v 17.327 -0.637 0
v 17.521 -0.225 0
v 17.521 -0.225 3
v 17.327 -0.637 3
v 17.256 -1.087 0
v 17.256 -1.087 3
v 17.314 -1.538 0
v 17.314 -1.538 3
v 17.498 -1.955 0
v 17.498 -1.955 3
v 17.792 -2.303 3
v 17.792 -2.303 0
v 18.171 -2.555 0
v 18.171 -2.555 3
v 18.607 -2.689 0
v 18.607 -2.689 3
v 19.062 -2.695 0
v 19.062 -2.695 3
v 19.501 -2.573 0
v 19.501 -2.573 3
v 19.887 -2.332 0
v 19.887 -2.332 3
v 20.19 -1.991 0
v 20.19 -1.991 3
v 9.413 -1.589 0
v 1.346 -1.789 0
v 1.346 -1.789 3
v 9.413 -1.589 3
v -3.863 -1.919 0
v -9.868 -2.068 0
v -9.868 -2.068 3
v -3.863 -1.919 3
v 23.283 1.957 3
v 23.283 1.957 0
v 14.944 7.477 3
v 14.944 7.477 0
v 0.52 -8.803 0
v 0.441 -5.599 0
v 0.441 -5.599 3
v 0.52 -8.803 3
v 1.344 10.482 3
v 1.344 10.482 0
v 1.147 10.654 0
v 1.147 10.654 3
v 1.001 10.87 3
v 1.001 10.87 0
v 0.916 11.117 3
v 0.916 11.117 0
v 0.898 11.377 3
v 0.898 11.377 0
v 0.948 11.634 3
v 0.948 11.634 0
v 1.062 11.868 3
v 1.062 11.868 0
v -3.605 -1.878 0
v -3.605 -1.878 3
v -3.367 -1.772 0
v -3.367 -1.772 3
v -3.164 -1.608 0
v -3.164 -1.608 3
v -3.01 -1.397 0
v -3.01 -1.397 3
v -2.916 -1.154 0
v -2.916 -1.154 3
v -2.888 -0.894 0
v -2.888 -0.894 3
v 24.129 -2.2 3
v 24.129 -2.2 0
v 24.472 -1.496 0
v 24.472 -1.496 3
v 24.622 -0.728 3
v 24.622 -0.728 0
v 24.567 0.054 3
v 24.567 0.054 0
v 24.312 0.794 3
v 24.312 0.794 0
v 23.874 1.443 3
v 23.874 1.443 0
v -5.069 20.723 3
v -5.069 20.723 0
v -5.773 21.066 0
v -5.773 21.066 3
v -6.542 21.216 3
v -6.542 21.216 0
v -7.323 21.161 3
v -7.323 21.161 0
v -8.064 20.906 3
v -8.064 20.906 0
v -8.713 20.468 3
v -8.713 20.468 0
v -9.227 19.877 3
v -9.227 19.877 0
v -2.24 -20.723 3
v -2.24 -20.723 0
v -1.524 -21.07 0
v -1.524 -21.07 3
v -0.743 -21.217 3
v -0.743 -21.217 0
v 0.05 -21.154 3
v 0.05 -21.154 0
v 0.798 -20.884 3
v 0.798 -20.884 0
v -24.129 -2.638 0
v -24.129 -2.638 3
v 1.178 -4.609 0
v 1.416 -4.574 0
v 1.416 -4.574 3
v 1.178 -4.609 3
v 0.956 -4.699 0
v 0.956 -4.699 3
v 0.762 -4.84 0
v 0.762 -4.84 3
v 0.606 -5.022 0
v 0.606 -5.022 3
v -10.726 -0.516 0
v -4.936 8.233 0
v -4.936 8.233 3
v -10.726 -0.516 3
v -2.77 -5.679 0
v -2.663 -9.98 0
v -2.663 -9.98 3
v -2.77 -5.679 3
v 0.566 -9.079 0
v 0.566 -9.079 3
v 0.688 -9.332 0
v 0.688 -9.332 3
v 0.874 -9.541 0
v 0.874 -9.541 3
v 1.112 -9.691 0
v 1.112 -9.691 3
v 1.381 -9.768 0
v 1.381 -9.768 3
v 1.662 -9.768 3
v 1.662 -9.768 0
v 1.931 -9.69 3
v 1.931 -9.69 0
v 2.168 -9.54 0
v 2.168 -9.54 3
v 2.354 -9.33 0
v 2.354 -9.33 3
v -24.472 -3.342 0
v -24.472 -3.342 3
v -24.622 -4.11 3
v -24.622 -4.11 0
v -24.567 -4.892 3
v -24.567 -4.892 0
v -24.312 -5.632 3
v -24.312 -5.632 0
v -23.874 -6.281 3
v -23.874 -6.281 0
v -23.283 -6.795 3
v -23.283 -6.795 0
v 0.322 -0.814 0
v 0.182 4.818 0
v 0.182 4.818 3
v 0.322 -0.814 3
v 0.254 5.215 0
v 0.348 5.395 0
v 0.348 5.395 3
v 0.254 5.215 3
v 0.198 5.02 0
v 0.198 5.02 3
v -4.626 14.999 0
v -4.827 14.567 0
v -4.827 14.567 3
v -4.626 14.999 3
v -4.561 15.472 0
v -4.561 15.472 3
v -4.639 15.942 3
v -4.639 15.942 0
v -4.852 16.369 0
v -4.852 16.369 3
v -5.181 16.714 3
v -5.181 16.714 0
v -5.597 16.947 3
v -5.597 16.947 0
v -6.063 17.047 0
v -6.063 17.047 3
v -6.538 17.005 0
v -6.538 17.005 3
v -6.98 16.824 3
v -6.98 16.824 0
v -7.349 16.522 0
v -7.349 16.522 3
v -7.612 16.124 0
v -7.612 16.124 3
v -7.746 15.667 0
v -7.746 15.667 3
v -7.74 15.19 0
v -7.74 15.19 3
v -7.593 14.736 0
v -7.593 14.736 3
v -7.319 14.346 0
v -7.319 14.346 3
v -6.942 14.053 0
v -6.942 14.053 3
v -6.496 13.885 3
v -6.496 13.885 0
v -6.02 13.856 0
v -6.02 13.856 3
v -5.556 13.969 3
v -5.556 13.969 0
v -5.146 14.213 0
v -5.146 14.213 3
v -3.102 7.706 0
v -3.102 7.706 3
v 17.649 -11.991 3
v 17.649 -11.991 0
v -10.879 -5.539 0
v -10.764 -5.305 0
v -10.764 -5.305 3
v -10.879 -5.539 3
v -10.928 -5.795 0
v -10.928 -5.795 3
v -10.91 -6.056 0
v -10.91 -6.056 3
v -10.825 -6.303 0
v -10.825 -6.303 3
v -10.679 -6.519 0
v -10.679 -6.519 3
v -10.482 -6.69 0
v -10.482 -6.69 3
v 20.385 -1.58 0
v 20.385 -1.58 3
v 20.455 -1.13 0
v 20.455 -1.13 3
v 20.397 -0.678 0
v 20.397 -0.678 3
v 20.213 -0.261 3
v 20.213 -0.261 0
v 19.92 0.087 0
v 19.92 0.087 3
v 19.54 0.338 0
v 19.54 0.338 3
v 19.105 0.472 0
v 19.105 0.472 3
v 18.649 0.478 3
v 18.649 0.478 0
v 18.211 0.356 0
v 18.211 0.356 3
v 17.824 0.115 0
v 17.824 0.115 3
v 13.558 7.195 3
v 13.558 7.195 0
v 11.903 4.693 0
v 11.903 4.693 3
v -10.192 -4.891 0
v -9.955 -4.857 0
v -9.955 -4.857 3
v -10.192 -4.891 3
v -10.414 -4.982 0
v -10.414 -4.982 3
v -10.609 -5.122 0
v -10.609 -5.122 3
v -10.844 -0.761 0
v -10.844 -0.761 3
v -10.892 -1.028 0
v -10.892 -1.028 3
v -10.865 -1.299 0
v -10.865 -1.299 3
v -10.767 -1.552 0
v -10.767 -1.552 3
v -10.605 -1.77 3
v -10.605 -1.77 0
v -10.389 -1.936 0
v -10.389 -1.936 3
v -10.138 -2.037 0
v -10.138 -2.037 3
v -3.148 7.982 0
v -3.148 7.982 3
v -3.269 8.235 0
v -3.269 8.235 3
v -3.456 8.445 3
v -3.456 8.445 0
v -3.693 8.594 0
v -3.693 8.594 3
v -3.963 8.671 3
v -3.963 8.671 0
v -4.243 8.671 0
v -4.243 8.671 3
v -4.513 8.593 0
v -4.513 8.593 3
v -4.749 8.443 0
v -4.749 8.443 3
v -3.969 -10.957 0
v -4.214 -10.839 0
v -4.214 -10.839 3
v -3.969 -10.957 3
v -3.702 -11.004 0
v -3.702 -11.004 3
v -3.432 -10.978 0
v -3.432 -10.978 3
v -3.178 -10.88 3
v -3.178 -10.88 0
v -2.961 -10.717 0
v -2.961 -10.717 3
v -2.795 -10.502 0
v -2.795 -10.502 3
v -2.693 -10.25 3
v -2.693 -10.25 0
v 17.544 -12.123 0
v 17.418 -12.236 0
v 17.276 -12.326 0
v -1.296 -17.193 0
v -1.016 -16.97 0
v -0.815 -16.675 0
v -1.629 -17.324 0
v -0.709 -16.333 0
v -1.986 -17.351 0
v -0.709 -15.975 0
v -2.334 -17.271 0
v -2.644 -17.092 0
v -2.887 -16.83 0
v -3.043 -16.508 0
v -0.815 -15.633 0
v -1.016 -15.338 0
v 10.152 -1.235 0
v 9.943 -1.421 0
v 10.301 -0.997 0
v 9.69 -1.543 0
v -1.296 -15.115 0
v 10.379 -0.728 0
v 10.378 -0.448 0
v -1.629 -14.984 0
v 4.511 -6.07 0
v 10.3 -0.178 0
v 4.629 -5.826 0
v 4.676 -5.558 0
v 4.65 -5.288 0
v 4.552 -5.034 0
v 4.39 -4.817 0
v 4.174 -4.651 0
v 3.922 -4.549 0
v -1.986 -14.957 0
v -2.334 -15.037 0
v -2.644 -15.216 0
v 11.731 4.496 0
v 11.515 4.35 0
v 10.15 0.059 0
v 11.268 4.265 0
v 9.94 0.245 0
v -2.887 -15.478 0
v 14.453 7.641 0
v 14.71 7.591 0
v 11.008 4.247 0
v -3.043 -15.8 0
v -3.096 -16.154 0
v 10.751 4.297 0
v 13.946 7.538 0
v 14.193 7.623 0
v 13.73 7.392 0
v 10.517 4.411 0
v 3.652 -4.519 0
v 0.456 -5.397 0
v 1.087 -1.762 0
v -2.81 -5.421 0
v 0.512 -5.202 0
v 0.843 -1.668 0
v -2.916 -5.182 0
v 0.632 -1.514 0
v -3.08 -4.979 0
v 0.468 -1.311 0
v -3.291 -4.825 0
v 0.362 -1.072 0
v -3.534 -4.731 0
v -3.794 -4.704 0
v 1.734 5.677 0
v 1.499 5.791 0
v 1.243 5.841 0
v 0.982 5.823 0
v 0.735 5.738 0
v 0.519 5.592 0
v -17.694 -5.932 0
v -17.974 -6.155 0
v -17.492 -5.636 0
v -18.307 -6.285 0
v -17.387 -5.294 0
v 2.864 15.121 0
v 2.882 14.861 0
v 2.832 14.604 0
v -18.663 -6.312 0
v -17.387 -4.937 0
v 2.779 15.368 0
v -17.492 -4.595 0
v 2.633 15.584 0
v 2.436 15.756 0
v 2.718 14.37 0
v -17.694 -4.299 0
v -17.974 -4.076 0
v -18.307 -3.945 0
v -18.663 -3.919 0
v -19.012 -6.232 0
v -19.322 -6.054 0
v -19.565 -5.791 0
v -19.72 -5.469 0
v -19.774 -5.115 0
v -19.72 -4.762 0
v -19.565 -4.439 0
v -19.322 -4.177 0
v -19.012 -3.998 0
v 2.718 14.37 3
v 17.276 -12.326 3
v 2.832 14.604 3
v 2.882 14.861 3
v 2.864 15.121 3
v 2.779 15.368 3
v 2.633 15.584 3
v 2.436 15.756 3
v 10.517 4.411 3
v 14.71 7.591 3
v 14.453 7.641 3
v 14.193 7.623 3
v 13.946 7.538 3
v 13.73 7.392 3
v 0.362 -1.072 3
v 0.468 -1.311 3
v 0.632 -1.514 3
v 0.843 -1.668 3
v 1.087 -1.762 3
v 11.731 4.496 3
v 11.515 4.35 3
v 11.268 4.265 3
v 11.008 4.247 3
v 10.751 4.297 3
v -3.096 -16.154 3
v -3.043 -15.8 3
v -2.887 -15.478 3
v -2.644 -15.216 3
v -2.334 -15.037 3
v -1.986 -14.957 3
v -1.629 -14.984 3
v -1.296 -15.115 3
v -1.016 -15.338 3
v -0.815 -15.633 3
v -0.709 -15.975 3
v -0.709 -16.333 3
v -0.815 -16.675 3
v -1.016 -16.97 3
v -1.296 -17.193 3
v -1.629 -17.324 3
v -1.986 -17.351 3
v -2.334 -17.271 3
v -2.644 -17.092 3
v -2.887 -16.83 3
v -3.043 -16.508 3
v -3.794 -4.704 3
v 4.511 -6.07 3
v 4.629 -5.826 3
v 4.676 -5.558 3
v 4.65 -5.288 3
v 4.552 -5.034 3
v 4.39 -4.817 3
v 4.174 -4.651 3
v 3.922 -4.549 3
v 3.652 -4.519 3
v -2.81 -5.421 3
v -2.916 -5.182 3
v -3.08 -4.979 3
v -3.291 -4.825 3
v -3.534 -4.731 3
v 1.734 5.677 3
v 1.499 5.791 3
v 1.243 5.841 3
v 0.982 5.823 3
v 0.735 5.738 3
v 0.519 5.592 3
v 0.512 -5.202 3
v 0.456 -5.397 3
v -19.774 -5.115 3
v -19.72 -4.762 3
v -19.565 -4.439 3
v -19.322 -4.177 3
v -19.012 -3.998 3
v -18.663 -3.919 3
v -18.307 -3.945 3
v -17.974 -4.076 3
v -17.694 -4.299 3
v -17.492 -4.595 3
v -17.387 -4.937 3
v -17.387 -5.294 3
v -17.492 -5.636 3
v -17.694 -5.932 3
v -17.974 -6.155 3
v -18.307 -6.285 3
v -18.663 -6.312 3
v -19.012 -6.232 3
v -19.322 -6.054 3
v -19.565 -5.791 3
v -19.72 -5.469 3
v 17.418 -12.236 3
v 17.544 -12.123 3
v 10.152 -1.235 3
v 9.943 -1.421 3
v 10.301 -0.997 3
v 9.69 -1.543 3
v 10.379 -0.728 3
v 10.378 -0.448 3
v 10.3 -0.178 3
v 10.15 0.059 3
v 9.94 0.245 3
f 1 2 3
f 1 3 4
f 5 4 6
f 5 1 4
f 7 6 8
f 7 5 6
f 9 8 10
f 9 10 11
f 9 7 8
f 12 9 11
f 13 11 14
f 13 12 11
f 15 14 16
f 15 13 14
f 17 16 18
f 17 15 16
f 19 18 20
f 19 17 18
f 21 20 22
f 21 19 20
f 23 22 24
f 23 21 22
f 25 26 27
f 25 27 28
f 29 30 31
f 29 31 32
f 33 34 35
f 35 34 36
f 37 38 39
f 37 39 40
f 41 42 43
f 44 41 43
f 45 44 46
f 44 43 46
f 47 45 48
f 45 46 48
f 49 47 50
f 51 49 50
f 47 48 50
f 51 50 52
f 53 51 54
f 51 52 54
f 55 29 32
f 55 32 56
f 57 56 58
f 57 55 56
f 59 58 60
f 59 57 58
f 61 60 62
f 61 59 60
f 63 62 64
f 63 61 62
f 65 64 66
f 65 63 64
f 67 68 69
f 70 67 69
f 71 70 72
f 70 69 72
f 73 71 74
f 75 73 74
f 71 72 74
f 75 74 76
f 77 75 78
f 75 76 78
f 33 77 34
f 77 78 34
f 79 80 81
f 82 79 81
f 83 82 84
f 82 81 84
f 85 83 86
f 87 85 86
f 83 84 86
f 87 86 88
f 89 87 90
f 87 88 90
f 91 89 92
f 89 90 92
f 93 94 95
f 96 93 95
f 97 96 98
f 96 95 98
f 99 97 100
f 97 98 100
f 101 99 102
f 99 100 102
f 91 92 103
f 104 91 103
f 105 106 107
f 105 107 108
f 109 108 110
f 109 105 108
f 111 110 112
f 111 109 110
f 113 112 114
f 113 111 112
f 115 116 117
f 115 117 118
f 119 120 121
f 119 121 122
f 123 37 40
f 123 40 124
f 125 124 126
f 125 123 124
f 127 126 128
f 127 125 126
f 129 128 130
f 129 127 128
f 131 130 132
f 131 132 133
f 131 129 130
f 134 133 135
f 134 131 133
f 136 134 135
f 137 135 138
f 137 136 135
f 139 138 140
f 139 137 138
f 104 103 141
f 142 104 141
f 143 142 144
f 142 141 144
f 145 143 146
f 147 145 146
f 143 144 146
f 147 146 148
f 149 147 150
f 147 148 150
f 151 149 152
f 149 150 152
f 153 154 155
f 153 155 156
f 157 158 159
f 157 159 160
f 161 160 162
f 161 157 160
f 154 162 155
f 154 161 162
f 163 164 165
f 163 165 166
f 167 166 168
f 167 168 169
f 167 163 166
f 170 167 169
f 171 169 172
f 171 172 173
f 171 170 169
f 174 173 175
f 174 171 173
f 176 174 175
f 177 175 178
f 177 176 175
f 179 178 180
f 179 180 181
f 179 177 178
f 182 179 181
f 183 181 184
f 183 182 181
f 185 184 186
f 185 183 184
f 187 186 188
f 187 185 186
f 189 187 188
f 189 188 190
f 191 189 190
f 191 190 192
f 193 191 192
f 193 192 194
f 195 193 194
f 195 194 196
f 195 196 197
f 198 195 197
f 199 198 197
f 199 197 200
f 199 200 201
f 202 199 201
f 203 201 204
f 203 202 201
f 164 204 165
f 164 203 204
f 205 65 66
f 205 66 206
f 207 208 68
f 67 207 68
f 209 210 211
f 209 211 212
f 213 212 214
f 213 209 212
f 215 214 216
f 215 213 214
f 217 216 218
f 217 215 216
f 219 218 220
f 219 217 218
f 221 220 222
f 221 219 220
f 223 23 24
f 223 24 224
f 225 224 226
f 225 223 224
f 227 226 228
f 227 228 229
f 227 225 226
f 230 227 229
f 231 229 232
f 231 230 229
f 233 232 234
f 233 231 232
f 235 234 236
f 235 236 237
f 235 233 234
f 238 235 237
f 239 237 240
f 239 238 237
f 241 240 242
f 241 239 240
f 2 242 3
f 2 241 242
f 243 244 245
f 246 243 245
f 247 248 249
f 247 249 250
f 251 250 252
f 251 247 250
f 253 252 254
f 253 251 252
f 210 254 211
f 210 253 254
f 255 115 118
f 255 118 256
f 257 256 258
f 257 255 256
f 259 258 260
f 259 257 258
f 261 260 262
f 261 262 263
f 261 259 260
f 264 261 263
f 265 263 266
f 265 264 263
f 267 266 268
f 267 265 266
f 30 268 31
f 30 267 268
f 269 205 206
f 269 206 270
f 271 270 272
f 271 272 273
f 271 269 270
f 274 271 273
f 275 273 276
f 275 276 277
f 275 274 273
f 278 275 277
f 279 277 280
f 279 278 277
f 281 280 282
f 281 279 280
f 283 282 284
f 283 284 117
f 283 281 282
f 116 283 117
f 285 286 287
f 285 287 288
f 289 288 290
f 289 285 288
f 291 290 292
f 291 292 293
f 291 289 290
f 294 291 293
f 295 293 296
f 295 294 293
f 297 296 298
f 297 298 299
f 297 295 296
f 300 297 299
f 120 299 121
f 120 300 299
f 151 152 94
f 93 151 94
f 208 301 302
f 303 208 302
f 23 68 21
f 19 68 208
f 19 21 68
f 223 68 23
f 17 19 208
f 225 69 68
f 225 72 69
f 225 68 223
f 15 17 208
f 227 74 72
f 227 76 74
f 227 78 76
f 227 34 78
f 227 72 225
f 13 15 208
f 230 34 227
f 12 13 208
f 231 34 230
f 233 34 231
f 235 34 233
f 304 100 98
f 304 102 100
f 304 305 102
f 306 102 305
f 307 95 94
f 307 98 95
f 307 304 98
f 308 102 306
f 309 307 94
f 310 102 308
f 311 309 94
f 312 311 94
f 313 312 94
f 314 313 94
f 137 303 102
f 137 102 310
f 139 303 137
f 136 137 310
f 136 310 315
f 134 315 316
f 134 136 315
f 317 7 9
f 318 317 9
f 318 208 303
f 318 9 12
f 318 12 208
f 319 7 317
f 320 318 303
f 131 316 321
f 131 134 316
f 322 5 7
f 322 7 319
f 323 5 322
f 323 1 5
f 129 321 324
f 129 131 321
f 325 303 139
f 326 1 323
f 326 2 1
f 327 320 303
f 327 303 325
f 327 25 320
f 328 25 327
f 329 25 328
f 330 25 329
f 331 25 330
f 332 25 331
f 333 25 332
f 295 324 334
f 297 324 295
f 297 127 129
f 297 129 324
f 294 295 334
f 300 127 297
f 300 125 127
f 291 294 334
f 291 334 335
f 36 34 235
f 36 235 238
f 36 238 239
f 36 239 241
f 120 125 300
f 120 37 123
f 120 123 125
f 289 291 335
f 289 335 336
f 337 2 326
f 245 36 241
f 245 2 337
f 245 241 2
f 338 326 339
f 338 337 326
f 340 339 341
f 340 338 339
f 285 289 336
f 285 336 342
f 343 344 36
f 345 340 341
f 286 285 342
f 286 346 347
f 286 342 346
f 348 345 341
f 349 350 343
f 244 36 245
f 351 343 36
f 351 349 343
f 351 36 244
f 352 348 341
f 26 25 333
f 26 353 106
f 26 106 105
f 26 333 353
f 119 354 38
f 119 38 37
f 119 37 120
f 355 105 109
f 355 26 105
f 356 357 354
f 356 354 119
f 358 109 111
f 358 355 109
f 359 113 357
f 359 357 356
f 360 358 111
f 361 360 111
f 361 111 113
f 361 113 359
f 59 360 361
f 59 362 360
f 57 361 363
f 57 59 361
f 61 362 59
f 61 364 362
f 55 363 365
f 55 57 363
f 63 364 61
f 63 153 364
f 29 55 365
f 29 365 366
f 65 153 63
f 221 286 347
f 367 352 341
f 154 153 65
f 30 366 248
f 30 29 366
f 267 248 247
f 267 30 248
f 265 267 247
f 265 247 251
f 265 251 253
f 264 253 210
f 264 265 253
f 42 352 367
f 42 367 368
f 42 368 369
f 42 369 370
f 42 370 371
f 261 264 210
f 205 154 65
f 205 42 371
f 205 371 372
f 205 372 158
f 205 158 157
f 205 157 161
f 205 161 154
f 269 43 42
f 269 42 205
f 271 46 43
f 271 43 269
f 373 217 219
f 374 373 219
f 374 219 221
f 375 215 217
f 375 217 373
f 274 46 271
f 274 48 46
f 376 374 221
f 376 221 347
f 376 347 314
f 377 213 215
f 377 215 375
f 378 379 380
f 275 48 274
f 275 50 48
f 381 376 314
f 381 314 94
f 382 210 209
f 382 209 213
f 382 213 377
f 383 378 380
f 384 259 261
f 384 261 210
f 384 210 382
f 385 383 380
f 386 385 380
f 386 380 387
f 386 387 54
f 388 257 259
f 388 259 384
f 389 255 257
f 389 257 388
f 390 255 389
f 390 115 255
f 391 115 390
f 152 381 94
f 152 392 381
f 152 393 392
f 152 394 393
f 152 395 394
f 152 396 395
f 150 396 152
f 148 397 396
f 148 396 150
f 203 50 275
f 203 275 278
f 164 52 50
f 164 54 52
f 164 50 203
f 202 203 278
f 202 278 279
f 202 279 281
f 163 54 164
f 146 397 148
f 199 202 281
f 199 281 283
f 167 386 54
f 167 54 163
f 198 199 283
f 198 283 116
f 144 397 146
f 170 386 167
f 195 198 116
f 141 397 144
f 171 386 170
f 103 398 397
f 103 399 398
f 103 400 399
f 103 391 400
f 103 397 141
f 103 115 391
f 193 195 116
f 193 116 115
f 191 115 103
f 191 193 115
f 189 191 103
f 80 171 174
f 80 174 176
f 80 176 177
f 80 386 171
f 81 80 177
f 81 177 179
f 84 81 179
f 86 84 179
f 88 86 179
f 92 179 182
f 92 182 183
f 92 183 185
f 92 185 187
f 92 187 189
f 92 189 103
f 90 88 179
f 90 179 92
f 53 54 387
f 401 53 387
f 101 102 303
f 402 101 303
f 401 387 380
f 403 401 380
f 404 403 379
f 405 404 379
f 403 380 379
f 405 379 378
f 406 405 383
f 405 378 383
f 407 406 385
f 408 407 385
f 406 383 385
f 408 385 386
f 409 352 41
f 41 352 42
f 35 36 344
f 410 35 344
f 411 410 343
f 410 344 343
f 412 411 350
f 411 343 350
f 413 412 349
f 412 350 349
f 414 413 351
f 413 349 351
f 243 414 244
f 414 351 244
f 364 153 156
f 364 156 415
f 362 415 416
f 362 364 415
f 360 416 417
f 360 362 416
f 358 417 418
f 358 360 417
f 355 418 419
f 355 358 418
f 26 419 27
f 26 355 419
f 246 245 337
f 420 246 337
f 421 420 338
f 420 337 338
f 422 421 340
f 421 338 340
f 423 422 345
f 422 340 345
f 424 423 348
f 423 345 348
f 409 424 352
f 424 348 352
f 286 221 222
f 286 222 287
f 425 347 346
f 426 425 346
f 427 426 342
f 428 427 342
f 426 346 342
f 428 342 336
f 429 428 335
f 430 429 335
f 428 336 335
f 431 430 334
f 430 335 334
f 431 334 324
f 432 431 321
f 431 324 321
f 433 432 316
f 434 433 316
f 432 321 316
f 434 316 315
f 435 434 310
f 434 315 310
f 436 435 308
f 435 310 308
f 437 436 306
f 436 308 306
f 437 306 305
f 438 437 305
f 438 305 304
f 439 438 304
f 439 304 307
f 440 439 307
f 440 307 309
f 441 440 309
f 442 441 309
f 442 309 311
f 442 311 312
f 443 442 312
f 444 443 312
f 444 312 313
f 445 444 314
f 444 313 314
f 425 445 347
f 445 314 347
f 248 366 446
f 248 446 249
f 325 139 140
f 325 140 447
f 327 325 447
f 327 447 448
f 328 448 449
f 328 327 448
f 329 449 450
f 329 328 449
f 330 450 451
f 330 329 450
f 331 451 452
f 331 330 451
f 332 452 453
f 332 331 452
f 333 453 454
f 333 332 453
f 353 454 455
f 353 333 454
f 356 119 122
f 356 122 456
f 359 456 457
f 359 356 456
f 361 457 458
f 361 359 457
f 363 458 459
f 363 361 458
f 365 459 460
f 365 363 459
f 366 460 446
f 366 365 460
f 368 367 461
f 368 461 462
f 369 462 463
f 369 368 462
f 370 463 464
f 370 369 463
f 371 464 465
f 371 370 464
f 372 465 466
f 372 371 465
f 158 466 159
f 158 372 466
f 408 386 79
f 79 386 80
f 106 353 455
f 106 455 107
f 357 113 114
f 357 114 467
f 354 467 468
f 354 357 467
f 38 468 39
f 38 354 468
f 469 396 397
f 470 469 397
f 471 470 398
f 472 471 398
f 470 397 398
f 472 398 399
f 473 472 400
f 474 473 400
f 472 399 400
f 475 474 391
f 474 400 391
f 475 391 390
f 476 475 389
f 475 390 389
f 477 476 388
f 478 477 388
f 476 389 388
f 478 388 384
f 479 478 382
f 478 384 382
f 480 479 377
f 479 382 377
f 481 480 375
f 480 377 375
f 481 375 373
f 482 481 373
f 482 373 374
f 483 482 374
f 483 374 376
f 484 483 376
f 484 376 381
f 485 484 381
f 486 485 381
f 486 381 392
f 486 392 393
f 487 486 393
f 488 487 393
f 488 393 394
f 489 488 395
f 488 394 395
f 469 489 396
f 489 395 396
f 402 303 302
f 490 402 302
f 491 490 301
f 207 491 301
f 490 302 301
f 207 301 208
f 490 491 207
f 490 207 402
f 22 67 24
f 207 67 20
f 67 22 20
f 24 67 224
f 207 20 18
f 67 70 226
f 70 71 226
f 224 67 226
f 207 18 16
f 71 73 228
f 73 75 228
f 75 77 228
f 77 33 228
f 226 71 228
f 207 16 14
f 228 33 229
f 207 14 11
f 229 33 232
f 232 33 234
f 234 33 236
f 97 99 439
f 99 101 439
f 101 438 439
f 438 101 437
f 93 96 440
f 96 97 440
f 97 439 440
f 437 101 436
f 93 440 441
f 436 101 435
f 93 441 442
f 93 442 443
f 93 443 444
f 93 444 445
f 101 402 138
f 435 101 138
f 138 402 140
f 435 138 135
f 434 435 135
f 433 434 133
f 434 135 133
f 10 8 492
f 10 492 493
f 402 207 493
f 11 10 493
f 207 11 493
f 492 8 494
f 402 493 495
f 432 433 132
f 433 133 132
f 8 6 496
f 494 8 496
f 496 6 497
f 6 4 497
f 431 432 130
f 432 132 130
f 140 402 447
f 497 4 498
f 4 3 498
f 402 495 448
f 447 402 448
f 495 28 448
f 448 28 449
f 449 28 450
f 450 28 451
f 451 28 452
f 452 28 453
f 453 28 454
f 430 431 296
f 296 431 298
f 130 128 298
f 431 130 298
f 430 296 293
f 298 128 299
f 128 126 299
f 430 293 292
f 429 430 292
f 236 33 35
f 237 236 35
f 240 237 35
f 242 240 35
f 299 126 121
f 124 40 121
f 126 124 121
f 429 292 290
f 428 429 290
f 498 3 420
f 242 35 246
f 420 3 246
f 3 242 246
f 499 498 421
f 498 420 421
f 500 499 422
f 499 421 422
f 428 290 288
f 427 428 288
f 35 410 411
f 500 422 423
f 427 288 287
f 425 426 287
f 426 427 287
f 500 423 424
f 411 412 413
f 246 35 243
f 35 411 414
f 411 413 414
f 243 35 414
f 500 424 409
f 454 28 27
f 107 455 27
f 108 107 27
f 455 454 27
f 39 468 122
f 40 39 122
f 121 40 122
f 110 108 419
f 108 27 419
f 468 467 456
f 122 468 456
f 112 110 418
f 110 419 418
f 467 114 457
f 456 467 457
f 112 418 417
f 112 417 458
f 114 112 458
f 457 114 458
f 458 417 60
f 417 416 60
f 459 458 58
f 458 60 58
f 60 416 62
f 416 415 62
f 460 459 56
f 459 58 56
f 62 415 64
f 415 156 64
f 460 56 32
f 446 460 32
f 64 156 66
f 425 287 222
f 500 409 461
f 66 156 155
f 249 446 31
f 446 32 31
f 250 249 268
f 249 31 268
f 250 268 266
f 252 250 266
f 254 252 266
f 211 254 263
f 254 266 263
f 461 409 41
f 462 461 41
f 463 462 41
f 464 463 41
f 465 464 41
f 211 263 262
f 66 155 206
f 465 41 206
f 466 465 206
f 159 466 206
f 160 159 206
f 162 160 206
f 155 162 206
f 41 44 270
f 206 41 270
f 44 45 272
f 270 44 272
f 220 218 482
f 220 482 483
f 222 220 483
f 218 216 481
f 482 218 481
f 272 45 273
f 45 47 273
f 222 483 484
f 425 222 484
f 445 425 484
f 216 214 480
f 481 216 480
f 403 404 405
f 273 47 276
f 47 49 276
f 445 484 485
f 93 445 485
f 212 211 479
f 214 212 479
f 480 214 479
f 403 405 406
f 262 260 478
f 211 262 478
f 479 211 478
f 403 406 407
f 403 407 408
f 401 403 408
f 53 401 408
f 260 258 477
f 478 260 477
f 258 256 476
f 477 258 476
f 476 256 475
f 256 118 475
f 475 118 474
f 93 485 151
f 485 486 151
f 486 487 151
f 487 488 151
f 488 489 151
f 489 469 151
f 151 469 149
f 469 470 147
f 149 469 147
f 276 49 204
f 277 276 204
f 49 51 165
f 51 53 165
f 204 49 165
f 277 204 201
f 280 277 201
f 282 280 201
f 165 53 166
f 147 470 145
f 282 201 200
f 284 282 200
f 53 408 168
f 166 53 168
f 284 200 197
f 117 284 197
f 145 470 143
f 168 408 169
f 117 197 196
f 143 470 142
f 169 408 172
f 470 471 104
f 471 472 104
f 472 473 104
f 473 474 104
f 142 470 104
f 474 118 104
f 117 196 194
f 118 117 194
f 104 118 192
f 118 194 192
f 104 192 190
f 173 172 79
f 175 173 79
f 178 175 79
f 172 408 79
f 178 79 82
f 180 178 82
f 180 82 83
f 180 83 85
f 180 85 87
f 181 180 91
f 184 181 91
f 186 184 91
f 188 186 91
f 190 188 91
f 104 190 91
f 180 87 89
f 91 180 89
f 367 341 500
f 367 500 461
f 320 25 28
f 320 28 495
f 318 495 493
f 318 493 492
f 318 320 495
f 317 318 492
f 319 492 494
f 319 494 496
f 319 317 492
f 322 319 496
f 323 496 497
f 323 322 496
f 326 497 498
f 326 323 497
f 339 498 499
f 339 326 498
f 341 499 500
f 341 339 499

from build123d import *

# Parameters (mm, degrees)
EXTRUDE_1_DEPTH = 3
SKETCH_2_R      = 2.1
SKETCH_2_R_2    = 1.2
EXTRUDE_2_DEPTH = 3


with BuildPart() as part:
    # 草图1 → 凸台-拉伸1 (new body)
    with BuildSketch(Plane.XY):
        with BuildLine():
            Line((0.798434478, -20.883817003), (17.2756604, -12.326264758))
            ThreePointArc((17.2756604, -12.326264758), (17.48353375, -12.18227786), (17.648643158, -11.990751257))
            Line((17.648643158, -11.990751257), (24.128865743, -2.200202913))
            ThreePointArc((24.128865743, -2.200202913), (24.566982391, 0.053711846), (23.283019233, 1.957265509))
            Line((23.283019233, 1.957265509), (14.944161012, 7.476635362))
            ThreePointArc((14.944161012, 7.476635362), (14.192856092, 7.622674245), (13.558338205, 7.194686526))
            Line((13.558338205, 7.194686526), (11.902527249, 4.693029059))
            ThreePointArc((11.902527249, 4.693029059), (11.268009361, 4.26504134), (10.516704441, 4.411080223))
            Line((10.516704441, 4.411080223), (1.343960399, 10.482387061))
            ThreePointArc((1.343960399, 10.482387061), (0.915972679, 11.116904949), (1.062011562, 11.868209869))
            Line((1.062011562, 11.868209869), (2.717822518, 14.369867335))
            ThreePointArc((2.717822518, 14.369867335), (2.8638614, 15.121172254), (2.435873681, 15.755690142))
            Line((2.435873681, 15.755690142), (-5.069098717, 20.72312301))
            ThreePointArc((-5.069098717, 20.72312301), (-7.323013477, 21.161239658), (-9.22656714, 19.8772765))
            Line((-9.22656714, 19.8772765), (-24.128865743, -2.637640696))
            ThreePointArc((-24.128865743, -2.637640696), (-24.566982391, -4.891555455), (-23.283019233, -6.795109118))
            Line((-23.283019233, -6.795109118), (-2.240085668, -20.72312301))
            ThreePointArc((-2.240085668, -20.72312301), (-0.742710136, -21.217278992), (0.798434478, -20.883817003))
        make_face()
        with BuildLine():
            Line((3.65242583, -4.518851403), (1.415541705, -4.574406046))
            ThreePointArc((1.415541705, -4.574406046), (0.956150335, -4.699151193), (0.606483954, -5.022160797))
            ThreePointArc((0.606483954, -5.022160797), (0.479294259, -5.297811966), (0.44067804, -5.598925853))
            Line((0.44067804, -5.598925853), (0.520246584, -8.802719514))
            ThreePointArc((0.520246584, -8.802719514), (1.243652504, -9.738966959), (2.353824142, -9.329828428))
            Line((2.353824142, -9.329828428), (4.511139723, -6.070480125))
            ThreePointArc((4.511139723, -6.070480125), (4.55220049, -5.034323699), (3.65242583, -4.518851403))
        make_face(mode=Mode.SUBTRACT)
        with BuildLine():
            Line((-3.794049487, -4.70379003), (-9.955030272, -4.856802465))
            ThreePointArc((-9.955030272, -4.856802465), (-10.414421641, -4.981547612), (-10.764088023, -5.304557216))
            ThreePointArc((-10.764088023, -5.304557216), (-10.910126905, -6.055862136), (-10.482139186, -6.690380023))
            Line((-10.482139186, -6.690380023), (-4.214325339, -10.838955509))
            ThreePointArc((-4.214325339, -10.838955509), (-3.178168913, -10.880016276), (-2.662696618, -9.980241616))
            Line((-2.662696618, -9.980241616), (-2.76952968, -5.678653695))
            ThreePointArc((-2.76952968, -5.678653695), (-3.079888708, -4.979036863), (-3.794049487, -4.70379003))
        make_face(mode=Mode.SUBTRACT)
        with BuildLine():
            Line((1.346368171, -1.789163051), (9.413331456, -1.588814155))
            ThreePointArc((9.413331456, -1.588814155), (10.349578901, -0.865408235), (9.94044037, 0.244763403))
            Line((9.94044037, 0.244763403), (1.733593774, 5.676756668))
            ThreePointArc((1.733593774, 5.676756668), (0.982288854, 5.822795551), (0.347770967, 5.394807831))
            ThreePointArc((0.347770967, 5.394807831), (0.220581273, 5.119156662), (0.181965053, 4.818042775))
            Line((0.181965053, 4.818042775), (0.321848364, -0.814299386))
            ThreePointArc((0.321848364, -0.814299386), (0.632207392, -1.513916218), (1.346368171, -1.789163051))
        make_face(mode=Mode.SUBTRACT)
        with BuildLine():
            Line((-9.867573328, -2.067669438), (-3.863223021, -1.918547035))
            ThreePointArc((-3.863223021, -1.918547035), (-3.163606189, -1.608188007), (-2.888359356, -0.894027228))
            Line((-2.888359356, -0.894027228), (-3.10194101, 7.705747447))
            ThreePointArc((-3.10194101, 7.705747447), (-3.82534693, 8.641994892), (-4.935518568, 8.232856362))
            Line((-4.935518568, 8.232856362), (-10.726287221, -0.516040717))
            ThreePointArc((-10.726287221, -0.516040717), (-10.767347988, -1.552197143), (-9.867573328, -2.067669438))
        make_face(mode=Mode.SUBTRACT)
        with BuildLine():
            ThreePointArc((17.521345347, -0.225190454), (17.972463486, -2.442506946), (20.189779977, -1.991388807))
            ThreePointArc((20.189779977, -1.991388807), (19.738661839, 0.225927685), (17.521345347, -0.225190454))
        make_face(mode=Mode.SUBTRACT)
        with BuildLine():
            ThreePointArc((-3.64705761, -14.995048823), (-3.054965053, -17.905276719), (-0.144737158, -17.313184161))
            ThreePointArc((-0.144737158, -17.313184161), (-0.736829715, -14.402956266), (-3.64705761, -14.995048823))
        make_face(mode=Mode.SUBTRACT)
        with BuildLine():
            ThreePointArc((-20.324774052, -3.956309117), (-19.732681494, -6.866537012), (-16.822453599, -6.274444455))
            ThreePointArc((-16.822453599, -6.274444455), (-17.414546156, -3.36421656), (-20.324774052, -3.956309117))
        make_face(mode=Mode.SUBTRACT)
        with BuildLine():
            ThreePointArc((-7.495229315, 16.332919105), (-7.044111176, 14.115602614), (-4.826794685, 14.566720752))
            ThreePointArc((-4.826794685, 14.566720752), (-5.277912823, 16.784037244), (-7.495229315, 16.332919105))
        make_face(mode=Mode.SUBTRACT)
    extrude(amount=EXTRUDE_1_DEPTH)

    # 草图2 → 凸台-拉伸2 (add)
    # profile 1 of 2: a face of its own
    with BuildSketch(Plane(origin=(0, 0, 0), x_dir=(-1, 0, 0), z_dir=(0, 0, -1))):
        with Locations((1.895897384, -16.154116492)):
            Circle(SKETCH_2_R)
        with Locations((1.895897384, -16.154116492)):
            Circle(SKETCH_2_R_2, mode=Mode.SUBTRACT)
    # profile 2 of 2: a face of its own
    with BuildSketch(Plane(origin=(0, 0, 0), x_dir=(-1, 0, 0), z_dir=(0, 0, -1))):
        with Locations((18.573613825, -5.115376786)):
            Circle(SKETCH_2_R)
        with Locations((18.573613825, -5.115376786)):
            Circle(SKETCH_2_R_2, mode=Mode.SUBTRACT)
    extrude(amount=-EXTRUDE_2_DEPTH)


solid = part.part
